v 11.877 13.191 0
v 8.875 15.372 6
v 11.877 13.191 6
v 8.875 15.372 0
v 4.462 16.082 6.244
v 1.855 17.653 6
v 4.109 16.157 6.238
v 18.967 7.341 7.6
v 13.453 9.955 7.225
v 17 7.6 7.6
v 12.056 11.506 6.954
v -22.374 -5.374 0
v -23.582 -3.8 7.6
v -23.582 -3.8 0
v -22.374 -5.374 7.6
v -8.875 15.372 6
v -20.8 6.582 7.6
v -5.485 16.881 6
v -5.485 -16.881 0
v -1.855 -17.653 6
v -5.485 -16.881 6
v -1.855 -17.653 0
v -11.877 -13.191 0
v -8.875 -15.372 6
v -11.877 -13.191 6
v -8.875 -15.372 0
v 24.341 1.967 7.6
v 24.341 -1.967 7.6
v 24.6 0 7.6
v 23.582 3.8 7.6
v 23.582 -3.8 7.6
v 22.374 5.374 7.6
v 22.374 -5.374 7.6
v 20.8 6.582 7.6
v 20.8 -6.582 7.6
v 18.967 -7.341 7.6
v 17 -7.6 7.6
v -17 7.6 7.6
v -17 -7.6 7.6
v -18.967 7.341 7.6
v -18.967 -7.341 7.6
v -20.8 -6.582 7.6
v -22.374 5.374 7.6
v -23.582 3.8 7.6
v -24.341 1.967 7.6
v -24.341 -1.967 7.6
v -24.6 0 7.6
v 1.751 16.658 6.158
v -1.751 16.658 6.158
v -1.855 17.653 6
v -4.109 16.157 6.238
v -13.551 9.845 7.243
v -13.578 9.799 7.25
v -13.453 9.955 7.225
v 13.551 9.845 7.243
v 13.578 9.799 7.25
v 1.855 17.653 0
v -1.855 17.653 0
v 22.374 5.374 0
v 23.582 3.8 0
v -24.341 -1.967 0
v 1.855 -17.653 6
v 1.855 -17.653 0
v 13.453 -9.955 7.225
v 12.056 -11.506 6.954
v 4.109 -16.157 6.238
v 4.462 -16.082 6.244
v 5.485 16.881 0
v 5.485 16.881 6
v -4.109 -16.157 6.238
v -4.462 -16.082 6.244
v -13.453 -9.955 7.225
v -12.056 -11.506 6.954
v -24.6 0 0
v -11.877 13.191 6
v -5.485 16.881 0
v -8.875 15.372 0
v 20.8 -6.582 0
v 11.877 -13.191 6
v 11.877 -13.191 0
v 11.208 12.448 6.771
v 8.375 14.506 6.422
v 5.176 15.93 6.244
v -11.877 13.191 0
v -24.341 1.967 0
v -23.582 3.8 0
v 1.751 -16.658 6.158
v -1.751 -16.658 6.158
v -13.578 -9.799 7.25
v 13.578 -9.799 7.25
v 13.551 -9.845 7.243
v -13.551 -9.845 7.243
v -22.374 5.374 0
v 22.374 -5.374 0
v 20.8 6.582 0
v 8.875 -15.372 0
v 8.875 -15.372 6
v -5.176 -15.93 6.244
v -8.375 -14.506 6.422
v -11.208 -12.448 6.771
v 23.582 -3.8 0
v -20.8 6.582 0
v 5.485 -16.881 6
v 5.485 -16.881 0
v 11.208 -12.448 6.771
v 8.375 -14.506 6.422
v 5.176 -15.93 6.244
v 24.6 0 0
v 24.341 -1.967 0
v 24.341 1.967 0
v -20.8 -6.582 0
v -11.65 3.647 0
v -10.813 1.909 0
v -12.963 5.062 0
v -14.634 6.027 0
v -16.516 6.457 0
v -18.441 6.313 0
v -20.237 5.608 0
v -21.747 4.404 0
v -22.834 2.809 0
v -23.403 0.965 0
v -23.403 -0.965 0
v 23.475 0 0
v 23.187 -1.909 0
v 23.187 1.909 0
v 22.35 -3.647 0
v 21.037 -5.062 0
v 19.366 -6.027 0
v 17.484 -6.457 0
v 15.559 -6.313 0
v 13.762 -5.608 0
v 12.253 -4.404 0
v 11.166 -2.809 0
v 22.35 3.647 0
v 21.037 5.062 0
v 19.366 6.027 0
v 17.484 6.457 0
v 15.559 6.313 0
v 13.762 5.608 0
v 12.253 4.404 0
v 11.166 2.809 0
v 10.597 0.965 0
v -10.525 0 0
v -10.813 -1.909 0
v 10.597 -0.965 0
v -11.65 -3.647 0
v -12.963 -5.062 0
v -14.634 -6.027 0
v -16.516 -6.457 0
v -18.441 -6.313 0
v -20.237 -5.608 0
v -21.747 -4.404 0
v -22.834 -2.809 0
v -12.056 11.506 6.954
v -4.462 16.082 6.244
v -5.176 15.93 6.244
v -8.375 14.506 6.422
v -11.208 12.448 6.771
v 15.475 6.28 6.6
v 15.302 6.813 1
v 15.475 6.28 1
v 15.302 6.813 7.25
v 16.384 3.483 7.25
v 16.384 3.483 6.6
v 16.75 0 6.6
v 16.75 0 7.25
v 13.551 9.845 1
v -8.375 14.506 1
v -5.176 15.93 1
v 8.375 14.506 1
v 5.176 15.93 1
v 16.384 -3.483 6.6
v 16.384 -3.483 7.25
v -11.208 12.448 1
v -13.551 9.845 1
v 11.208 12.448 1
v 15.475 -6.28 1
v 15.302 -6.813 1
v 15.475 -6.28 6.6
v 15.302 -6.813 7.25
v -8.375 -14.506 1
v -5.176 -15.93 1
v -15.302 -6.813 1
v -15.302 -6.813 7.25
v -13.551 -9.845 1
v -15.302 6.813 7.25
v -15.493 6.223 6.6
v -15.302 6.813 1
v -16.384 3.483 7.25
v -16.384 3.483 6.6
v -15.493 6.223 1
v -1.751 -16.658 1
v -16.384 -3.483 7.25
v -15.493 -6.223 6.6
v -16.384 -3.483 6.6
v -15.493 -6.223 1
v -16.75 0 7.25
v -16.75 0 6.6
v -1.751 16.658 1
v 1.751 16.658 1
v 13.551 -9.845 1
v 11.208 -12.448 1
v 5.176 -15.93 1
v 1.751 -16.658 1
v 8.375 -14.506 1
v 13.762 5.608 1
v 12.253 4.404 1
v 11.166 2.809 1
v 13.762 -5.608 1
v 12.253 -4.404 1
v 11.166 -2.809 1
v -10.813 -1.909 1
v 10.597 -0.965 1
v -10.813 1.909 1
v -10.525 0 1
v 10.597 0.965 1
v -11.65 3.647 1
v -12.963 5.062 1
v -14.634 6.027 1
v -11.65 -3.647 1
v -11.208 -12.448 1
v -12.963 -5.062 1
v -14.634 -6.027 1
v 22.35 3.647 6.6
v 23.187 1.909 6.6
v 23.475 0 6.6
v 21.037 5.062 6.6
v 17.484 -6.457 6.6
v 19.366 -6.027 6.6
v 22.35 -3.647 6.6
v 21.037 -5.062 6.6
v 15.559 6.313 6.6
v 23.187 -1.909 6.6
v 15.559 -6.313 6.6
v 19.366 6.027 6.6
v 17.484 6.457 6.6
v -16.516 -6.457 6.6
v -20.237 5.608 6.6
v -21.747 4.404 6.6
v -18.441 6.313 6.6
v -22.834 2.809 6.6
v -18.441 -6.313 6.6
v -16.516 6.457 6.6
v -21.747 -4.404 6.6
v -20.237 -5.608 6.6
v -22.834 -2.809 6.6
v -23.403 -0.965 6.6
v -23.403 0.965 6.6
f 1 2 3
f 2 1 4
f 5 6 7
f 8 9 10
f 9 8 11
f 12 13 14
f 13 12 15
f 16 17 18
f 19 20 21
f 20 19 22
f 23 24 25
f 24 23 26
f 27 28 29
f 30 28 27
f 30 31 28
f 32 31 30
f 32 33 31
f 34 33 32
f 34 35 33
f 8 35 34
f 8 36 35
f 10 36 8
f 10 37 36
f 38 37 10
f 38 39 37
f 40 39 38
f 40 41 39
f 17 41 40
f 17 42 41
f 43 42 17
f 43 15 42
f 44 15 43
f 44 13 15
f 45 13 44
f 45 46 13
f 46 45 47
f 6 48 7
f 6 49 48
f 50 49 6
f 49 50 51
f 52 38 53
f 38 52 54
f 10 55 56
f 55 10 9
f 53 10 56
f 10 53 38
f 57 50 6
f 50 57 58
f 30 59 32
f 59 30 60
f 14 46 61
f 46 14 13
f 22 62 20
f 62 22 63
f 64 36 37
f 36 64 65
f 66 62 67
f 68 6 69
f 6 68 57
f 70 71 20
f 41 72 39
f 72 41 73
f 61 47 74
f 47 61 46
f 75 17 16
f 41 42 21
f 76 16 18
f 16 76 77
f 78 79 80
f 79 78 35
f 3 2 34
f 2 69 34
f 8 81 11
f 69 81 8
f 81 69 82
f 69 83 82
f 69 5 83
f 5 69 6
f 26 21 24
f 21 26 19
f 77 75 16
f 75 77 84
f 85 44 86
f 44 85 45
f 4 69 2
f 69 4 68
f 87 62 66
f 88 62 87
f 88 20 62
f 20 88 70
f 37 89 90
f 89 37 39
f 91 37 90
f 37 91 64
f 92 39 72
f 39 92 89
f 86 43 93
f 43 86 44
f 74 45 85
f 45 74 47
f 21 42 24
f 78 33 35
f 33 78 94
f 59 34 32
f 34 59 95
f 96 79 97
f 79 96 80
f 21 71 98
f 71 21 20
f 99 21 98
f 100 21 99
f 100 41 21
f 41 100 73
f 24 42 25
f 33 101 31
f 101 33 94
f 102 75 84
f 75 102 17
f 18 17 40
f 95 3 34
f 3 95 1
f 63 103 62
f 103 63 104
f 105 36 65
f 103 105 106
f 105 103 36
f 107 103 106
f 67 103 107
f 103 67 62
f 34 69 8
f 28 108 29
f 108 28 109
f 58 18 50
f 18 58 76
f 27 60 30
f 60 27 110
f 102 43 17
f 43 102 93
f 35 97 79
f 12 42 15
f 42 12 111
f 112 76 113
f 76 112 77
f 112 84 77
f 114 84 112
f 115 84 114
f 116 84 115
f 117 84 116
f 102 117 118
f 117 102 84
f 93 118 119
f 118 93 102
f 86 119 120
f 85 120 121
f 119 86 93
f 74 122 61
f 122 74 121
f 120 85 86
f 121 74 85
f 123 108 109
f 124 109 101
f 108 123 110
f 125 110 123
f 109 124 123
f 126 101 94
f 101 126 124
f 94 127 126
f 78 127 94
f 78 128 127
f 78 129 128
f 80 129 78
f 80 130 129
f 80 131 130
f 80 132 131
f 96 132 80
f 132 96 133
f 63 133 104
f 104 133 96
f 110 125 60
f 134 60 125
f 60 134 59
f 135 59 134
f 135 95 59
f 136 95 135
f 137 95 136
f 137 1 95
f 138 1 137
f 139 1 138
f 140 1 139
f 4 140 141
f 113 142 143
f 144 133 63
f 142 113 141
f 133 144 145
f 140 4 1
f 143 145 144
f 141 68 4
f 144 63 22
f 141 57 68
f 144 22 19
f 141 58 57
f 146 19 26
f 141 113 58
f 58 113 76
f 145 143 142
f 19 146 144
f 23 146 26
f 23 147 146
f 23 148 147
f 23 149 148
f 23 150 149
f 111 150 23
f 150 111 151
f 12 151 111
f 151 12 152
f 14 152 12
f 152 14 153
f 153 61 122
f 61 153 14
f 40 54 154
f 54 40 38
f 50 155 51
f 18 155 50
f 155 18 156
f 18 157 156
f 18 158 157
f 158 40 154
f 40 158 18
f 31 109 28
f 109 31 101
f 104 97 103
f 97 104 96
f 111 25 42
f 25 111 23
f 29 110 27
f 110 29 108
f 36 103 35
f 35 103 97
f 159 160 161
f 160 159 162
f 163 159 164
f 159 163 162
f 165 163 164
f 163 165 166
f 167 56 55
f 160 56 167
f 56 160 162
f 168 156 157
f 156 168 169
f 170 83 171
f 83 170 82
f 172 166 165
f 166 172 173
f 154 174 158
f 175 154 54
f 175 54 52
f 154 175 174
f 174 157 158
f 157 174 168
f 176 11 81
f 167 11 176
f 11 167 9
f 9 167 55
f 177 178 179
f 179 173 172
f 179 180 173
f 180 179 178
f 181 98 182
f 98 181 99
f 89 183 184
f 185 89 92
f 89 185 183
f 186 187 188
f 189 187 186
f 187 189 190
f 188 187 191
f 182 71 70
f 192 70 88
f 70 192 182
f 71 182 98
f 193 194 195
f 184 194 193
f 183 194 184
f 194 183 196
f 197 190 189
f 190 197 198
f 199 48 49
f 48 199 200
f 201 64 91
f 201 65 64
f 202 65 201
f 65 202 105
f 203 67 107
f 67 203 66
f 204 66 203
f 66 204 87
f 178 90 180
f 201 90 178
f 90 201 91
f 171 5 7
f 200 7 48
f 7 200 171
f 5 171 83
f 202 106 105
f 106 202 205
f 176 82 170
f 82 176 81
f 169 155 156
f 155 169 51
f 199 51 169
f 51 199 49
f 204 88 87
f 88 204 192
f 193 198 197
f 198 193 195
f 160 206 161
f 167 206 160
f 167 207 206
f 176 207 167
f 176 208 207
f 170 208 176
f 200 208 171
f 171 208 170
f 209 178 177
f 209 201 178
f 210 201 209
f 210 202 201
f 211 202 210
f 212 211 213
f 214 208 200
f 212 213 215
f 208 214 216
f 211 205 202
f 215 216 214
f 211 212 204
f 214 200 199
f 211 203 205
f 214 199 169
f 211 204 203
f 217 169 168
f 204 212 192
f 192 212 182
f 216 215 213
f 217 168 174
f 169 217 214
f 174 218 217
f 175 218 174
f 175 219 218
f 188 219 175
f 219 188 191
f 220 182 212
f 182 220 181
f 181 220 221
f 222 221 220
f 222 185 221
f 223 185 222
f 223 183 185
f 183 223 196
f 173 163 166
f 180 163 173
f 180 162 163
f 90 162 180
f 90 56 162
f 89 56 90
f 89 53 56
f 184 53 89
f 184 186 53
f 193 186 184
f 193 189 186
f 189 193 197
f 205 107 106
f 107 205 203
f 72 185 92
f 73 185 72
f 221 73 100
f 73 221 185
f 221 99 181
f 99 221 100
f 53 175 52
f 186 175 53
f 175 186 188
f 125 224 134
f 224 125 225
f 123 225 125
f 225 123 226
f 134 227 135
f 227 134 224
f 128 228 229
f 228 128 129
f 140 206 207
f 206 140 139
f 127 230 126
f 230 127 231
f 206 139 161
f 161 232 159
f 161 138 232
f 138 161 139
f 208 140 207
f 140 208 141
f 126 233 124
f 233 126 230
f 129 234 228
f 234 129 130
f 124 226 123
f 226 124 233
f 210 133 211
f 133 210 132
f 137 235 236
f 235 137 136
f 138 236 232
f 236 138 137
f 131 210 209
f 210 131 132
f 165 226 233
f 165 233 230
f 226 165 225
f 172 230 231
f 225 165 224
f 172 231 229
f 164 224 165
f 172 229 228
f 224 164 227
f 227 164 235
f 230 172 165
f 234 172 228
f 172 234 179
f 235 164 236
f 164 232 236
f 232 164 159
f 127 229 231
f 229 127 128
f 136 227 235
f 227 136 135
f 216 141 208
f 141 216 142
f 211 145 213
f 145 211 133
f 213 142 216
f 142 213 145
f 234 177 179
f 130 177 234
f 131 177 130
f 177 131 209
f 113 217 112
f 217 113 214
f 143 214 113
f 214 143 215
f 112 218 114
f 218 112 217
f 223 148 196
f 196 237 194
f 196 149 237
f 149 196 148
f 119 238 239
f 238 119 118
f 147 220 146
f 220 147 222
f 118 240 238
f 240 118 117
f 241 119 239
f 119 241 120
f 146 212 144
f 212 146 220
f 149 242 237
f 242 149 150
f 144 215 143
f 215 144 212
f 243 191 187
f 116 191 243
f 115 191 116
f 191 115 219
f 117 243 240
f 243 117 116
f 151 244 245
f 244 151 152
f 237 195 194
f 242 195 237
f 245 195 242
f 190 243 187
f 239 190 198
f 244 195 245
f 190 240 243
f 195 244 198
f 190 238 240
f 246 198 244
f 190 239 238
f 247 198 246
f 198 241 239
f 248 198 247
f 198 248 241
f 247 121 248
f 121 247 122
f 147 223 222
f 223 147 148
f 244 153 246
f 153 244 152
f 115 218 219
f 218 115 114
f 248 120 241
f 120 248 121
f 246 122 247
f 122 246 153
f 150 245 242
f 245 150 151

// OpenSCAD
// height of the original holder
//totalHeight=8.5;

// distance from fan to top of skeleton
totalHeight=6.0;

// this should be the diameter of the fan hub
hubDiameter=33;
wallThickness=1.0;
tol=0.25;

holderDiameter=hubDiameter+(wallThickness*2)+(tol*2);

// opening is 52, so the biggest part we can make is 50
maxLength=50;

washerDiameter=35;
// Washer Diameter - 0 will make a solid holder
washerDiameter=0;
washerHeight=2.4;

// reference/original sizes
//magnetDiameter=15;
//magnetHeight=3;

magnetDiameter=12.70;
//magnetHeight=3.16; // 1/8 in disc
magnetHeight=6.35; // 1/4 in disc
stirBarLength=34; // 34 is the biggest we can do and still fit in the hole of the top of the frame.

componentLength=stirBarLength+magnetDiameter+wallThickness*2+tol*2;

washerLedgeDef=2;
magnetWallHeight=( washerDiameter > 0 ? 2 : magnetHeight + wallThickness+tol );

washerLedge=( wallThickness > washerLedgeDef ? wallThickness : washerLedgeDef );

// if the stirbar is longer than the holder we will not be using a washer so the component height isn't important
// except the top then needs to be modified too.. put this on the backburner
componentHeight = ( washerDiameter > 0 ? washerHeight + magnetHeight : magnetHeight );

if ( componentLength > maxLength )
{
    echo("<b>Warning!</b>: Component Length exceeds maximum Length.");
    echo(maxLength=maxLength,componentLength=componentLength);
    %cylinder(h=totalHeight,d=maxLength);
}

if ( totalHeight < componentHeight )
{
    echo("<b>Warning!</b>: Component Height exceeds requested Total Height");
    echo(totalHeight=totalHeight,componentHeight=componentHeight);
    %cylinder(h=componentHeight,d=washerDiameter);
}
else if ( totalHeight == componentHeight )
{
    echo("<b>Warning!</b>: Component Height exactly matches Total Height");
    echo(totalHeight=totalHeight,componentHeight=componentHeight);
    %cylinder(h=componentHeight,d=washerDiameter);
}

// main body
difference()
{
    maybeHull(( washerDiameter > 0 ? false : true ))
    {
        cylinder(h=totalHeight,d=holderDiameter);
        
        // magnet walls
        translate([stirBarLength/2,0,0])
            cylinder(h=magnetWallHeight,d=magnetDiameter+wallThickness*2+tol*2);
        translate([-stirBarLength/2,0,0])
            cylinder(h=magnetWallHeight,d=magnetDiameter+wallThickness*2+tol*2);
    }

    if ( washerDiameter > 0 )
    {
        // washer recess
        translate([0,0,magnetHeight])
            cylinder(h=totalHeight,d=washerDiameter+(tol*2));
        // washer ledge
        translate([0,0,wallThickness])
            cylinder(h=totalHeight+tol,d=washerDiameter-washerLedge);
    }
    else
    {
        // hollow it out
        translate([0,0,wallThickness])
            cylinder(h=totalHeight+tol,d=holderDiameter-(wallThickness*2));
    }

    // magnet holes
    magnetRecess=(washerDiameter > 0 ? totalHeight : magnetHeight );
    translate([stirBarLength/2,0,-tol])
        cylinder(h=magnetRecess+tol+tol,d=magnetDiameter+tol);
    translate([-stirBarLength/2,0,-tol])
        cylinder(h=magnetRecess+tol+tol,d=magnetDiameter+tol);  
}

// if there is more than <tol> difference, make a spacer
if ( ( componentHeight + tol ) < totalHeight )
{
    spacerHeight=totalHeight-componentHeight-tol;
    translate([holderDiameter*2,0])
        cylinder(h=spacerHeight,d=washerDiameter);
}

module maybeHull(doHull=true)
{
    if ( doHull )
    {
        hull()
        {
            children();
        }
    }
    else
    {
        children();
    }
}
